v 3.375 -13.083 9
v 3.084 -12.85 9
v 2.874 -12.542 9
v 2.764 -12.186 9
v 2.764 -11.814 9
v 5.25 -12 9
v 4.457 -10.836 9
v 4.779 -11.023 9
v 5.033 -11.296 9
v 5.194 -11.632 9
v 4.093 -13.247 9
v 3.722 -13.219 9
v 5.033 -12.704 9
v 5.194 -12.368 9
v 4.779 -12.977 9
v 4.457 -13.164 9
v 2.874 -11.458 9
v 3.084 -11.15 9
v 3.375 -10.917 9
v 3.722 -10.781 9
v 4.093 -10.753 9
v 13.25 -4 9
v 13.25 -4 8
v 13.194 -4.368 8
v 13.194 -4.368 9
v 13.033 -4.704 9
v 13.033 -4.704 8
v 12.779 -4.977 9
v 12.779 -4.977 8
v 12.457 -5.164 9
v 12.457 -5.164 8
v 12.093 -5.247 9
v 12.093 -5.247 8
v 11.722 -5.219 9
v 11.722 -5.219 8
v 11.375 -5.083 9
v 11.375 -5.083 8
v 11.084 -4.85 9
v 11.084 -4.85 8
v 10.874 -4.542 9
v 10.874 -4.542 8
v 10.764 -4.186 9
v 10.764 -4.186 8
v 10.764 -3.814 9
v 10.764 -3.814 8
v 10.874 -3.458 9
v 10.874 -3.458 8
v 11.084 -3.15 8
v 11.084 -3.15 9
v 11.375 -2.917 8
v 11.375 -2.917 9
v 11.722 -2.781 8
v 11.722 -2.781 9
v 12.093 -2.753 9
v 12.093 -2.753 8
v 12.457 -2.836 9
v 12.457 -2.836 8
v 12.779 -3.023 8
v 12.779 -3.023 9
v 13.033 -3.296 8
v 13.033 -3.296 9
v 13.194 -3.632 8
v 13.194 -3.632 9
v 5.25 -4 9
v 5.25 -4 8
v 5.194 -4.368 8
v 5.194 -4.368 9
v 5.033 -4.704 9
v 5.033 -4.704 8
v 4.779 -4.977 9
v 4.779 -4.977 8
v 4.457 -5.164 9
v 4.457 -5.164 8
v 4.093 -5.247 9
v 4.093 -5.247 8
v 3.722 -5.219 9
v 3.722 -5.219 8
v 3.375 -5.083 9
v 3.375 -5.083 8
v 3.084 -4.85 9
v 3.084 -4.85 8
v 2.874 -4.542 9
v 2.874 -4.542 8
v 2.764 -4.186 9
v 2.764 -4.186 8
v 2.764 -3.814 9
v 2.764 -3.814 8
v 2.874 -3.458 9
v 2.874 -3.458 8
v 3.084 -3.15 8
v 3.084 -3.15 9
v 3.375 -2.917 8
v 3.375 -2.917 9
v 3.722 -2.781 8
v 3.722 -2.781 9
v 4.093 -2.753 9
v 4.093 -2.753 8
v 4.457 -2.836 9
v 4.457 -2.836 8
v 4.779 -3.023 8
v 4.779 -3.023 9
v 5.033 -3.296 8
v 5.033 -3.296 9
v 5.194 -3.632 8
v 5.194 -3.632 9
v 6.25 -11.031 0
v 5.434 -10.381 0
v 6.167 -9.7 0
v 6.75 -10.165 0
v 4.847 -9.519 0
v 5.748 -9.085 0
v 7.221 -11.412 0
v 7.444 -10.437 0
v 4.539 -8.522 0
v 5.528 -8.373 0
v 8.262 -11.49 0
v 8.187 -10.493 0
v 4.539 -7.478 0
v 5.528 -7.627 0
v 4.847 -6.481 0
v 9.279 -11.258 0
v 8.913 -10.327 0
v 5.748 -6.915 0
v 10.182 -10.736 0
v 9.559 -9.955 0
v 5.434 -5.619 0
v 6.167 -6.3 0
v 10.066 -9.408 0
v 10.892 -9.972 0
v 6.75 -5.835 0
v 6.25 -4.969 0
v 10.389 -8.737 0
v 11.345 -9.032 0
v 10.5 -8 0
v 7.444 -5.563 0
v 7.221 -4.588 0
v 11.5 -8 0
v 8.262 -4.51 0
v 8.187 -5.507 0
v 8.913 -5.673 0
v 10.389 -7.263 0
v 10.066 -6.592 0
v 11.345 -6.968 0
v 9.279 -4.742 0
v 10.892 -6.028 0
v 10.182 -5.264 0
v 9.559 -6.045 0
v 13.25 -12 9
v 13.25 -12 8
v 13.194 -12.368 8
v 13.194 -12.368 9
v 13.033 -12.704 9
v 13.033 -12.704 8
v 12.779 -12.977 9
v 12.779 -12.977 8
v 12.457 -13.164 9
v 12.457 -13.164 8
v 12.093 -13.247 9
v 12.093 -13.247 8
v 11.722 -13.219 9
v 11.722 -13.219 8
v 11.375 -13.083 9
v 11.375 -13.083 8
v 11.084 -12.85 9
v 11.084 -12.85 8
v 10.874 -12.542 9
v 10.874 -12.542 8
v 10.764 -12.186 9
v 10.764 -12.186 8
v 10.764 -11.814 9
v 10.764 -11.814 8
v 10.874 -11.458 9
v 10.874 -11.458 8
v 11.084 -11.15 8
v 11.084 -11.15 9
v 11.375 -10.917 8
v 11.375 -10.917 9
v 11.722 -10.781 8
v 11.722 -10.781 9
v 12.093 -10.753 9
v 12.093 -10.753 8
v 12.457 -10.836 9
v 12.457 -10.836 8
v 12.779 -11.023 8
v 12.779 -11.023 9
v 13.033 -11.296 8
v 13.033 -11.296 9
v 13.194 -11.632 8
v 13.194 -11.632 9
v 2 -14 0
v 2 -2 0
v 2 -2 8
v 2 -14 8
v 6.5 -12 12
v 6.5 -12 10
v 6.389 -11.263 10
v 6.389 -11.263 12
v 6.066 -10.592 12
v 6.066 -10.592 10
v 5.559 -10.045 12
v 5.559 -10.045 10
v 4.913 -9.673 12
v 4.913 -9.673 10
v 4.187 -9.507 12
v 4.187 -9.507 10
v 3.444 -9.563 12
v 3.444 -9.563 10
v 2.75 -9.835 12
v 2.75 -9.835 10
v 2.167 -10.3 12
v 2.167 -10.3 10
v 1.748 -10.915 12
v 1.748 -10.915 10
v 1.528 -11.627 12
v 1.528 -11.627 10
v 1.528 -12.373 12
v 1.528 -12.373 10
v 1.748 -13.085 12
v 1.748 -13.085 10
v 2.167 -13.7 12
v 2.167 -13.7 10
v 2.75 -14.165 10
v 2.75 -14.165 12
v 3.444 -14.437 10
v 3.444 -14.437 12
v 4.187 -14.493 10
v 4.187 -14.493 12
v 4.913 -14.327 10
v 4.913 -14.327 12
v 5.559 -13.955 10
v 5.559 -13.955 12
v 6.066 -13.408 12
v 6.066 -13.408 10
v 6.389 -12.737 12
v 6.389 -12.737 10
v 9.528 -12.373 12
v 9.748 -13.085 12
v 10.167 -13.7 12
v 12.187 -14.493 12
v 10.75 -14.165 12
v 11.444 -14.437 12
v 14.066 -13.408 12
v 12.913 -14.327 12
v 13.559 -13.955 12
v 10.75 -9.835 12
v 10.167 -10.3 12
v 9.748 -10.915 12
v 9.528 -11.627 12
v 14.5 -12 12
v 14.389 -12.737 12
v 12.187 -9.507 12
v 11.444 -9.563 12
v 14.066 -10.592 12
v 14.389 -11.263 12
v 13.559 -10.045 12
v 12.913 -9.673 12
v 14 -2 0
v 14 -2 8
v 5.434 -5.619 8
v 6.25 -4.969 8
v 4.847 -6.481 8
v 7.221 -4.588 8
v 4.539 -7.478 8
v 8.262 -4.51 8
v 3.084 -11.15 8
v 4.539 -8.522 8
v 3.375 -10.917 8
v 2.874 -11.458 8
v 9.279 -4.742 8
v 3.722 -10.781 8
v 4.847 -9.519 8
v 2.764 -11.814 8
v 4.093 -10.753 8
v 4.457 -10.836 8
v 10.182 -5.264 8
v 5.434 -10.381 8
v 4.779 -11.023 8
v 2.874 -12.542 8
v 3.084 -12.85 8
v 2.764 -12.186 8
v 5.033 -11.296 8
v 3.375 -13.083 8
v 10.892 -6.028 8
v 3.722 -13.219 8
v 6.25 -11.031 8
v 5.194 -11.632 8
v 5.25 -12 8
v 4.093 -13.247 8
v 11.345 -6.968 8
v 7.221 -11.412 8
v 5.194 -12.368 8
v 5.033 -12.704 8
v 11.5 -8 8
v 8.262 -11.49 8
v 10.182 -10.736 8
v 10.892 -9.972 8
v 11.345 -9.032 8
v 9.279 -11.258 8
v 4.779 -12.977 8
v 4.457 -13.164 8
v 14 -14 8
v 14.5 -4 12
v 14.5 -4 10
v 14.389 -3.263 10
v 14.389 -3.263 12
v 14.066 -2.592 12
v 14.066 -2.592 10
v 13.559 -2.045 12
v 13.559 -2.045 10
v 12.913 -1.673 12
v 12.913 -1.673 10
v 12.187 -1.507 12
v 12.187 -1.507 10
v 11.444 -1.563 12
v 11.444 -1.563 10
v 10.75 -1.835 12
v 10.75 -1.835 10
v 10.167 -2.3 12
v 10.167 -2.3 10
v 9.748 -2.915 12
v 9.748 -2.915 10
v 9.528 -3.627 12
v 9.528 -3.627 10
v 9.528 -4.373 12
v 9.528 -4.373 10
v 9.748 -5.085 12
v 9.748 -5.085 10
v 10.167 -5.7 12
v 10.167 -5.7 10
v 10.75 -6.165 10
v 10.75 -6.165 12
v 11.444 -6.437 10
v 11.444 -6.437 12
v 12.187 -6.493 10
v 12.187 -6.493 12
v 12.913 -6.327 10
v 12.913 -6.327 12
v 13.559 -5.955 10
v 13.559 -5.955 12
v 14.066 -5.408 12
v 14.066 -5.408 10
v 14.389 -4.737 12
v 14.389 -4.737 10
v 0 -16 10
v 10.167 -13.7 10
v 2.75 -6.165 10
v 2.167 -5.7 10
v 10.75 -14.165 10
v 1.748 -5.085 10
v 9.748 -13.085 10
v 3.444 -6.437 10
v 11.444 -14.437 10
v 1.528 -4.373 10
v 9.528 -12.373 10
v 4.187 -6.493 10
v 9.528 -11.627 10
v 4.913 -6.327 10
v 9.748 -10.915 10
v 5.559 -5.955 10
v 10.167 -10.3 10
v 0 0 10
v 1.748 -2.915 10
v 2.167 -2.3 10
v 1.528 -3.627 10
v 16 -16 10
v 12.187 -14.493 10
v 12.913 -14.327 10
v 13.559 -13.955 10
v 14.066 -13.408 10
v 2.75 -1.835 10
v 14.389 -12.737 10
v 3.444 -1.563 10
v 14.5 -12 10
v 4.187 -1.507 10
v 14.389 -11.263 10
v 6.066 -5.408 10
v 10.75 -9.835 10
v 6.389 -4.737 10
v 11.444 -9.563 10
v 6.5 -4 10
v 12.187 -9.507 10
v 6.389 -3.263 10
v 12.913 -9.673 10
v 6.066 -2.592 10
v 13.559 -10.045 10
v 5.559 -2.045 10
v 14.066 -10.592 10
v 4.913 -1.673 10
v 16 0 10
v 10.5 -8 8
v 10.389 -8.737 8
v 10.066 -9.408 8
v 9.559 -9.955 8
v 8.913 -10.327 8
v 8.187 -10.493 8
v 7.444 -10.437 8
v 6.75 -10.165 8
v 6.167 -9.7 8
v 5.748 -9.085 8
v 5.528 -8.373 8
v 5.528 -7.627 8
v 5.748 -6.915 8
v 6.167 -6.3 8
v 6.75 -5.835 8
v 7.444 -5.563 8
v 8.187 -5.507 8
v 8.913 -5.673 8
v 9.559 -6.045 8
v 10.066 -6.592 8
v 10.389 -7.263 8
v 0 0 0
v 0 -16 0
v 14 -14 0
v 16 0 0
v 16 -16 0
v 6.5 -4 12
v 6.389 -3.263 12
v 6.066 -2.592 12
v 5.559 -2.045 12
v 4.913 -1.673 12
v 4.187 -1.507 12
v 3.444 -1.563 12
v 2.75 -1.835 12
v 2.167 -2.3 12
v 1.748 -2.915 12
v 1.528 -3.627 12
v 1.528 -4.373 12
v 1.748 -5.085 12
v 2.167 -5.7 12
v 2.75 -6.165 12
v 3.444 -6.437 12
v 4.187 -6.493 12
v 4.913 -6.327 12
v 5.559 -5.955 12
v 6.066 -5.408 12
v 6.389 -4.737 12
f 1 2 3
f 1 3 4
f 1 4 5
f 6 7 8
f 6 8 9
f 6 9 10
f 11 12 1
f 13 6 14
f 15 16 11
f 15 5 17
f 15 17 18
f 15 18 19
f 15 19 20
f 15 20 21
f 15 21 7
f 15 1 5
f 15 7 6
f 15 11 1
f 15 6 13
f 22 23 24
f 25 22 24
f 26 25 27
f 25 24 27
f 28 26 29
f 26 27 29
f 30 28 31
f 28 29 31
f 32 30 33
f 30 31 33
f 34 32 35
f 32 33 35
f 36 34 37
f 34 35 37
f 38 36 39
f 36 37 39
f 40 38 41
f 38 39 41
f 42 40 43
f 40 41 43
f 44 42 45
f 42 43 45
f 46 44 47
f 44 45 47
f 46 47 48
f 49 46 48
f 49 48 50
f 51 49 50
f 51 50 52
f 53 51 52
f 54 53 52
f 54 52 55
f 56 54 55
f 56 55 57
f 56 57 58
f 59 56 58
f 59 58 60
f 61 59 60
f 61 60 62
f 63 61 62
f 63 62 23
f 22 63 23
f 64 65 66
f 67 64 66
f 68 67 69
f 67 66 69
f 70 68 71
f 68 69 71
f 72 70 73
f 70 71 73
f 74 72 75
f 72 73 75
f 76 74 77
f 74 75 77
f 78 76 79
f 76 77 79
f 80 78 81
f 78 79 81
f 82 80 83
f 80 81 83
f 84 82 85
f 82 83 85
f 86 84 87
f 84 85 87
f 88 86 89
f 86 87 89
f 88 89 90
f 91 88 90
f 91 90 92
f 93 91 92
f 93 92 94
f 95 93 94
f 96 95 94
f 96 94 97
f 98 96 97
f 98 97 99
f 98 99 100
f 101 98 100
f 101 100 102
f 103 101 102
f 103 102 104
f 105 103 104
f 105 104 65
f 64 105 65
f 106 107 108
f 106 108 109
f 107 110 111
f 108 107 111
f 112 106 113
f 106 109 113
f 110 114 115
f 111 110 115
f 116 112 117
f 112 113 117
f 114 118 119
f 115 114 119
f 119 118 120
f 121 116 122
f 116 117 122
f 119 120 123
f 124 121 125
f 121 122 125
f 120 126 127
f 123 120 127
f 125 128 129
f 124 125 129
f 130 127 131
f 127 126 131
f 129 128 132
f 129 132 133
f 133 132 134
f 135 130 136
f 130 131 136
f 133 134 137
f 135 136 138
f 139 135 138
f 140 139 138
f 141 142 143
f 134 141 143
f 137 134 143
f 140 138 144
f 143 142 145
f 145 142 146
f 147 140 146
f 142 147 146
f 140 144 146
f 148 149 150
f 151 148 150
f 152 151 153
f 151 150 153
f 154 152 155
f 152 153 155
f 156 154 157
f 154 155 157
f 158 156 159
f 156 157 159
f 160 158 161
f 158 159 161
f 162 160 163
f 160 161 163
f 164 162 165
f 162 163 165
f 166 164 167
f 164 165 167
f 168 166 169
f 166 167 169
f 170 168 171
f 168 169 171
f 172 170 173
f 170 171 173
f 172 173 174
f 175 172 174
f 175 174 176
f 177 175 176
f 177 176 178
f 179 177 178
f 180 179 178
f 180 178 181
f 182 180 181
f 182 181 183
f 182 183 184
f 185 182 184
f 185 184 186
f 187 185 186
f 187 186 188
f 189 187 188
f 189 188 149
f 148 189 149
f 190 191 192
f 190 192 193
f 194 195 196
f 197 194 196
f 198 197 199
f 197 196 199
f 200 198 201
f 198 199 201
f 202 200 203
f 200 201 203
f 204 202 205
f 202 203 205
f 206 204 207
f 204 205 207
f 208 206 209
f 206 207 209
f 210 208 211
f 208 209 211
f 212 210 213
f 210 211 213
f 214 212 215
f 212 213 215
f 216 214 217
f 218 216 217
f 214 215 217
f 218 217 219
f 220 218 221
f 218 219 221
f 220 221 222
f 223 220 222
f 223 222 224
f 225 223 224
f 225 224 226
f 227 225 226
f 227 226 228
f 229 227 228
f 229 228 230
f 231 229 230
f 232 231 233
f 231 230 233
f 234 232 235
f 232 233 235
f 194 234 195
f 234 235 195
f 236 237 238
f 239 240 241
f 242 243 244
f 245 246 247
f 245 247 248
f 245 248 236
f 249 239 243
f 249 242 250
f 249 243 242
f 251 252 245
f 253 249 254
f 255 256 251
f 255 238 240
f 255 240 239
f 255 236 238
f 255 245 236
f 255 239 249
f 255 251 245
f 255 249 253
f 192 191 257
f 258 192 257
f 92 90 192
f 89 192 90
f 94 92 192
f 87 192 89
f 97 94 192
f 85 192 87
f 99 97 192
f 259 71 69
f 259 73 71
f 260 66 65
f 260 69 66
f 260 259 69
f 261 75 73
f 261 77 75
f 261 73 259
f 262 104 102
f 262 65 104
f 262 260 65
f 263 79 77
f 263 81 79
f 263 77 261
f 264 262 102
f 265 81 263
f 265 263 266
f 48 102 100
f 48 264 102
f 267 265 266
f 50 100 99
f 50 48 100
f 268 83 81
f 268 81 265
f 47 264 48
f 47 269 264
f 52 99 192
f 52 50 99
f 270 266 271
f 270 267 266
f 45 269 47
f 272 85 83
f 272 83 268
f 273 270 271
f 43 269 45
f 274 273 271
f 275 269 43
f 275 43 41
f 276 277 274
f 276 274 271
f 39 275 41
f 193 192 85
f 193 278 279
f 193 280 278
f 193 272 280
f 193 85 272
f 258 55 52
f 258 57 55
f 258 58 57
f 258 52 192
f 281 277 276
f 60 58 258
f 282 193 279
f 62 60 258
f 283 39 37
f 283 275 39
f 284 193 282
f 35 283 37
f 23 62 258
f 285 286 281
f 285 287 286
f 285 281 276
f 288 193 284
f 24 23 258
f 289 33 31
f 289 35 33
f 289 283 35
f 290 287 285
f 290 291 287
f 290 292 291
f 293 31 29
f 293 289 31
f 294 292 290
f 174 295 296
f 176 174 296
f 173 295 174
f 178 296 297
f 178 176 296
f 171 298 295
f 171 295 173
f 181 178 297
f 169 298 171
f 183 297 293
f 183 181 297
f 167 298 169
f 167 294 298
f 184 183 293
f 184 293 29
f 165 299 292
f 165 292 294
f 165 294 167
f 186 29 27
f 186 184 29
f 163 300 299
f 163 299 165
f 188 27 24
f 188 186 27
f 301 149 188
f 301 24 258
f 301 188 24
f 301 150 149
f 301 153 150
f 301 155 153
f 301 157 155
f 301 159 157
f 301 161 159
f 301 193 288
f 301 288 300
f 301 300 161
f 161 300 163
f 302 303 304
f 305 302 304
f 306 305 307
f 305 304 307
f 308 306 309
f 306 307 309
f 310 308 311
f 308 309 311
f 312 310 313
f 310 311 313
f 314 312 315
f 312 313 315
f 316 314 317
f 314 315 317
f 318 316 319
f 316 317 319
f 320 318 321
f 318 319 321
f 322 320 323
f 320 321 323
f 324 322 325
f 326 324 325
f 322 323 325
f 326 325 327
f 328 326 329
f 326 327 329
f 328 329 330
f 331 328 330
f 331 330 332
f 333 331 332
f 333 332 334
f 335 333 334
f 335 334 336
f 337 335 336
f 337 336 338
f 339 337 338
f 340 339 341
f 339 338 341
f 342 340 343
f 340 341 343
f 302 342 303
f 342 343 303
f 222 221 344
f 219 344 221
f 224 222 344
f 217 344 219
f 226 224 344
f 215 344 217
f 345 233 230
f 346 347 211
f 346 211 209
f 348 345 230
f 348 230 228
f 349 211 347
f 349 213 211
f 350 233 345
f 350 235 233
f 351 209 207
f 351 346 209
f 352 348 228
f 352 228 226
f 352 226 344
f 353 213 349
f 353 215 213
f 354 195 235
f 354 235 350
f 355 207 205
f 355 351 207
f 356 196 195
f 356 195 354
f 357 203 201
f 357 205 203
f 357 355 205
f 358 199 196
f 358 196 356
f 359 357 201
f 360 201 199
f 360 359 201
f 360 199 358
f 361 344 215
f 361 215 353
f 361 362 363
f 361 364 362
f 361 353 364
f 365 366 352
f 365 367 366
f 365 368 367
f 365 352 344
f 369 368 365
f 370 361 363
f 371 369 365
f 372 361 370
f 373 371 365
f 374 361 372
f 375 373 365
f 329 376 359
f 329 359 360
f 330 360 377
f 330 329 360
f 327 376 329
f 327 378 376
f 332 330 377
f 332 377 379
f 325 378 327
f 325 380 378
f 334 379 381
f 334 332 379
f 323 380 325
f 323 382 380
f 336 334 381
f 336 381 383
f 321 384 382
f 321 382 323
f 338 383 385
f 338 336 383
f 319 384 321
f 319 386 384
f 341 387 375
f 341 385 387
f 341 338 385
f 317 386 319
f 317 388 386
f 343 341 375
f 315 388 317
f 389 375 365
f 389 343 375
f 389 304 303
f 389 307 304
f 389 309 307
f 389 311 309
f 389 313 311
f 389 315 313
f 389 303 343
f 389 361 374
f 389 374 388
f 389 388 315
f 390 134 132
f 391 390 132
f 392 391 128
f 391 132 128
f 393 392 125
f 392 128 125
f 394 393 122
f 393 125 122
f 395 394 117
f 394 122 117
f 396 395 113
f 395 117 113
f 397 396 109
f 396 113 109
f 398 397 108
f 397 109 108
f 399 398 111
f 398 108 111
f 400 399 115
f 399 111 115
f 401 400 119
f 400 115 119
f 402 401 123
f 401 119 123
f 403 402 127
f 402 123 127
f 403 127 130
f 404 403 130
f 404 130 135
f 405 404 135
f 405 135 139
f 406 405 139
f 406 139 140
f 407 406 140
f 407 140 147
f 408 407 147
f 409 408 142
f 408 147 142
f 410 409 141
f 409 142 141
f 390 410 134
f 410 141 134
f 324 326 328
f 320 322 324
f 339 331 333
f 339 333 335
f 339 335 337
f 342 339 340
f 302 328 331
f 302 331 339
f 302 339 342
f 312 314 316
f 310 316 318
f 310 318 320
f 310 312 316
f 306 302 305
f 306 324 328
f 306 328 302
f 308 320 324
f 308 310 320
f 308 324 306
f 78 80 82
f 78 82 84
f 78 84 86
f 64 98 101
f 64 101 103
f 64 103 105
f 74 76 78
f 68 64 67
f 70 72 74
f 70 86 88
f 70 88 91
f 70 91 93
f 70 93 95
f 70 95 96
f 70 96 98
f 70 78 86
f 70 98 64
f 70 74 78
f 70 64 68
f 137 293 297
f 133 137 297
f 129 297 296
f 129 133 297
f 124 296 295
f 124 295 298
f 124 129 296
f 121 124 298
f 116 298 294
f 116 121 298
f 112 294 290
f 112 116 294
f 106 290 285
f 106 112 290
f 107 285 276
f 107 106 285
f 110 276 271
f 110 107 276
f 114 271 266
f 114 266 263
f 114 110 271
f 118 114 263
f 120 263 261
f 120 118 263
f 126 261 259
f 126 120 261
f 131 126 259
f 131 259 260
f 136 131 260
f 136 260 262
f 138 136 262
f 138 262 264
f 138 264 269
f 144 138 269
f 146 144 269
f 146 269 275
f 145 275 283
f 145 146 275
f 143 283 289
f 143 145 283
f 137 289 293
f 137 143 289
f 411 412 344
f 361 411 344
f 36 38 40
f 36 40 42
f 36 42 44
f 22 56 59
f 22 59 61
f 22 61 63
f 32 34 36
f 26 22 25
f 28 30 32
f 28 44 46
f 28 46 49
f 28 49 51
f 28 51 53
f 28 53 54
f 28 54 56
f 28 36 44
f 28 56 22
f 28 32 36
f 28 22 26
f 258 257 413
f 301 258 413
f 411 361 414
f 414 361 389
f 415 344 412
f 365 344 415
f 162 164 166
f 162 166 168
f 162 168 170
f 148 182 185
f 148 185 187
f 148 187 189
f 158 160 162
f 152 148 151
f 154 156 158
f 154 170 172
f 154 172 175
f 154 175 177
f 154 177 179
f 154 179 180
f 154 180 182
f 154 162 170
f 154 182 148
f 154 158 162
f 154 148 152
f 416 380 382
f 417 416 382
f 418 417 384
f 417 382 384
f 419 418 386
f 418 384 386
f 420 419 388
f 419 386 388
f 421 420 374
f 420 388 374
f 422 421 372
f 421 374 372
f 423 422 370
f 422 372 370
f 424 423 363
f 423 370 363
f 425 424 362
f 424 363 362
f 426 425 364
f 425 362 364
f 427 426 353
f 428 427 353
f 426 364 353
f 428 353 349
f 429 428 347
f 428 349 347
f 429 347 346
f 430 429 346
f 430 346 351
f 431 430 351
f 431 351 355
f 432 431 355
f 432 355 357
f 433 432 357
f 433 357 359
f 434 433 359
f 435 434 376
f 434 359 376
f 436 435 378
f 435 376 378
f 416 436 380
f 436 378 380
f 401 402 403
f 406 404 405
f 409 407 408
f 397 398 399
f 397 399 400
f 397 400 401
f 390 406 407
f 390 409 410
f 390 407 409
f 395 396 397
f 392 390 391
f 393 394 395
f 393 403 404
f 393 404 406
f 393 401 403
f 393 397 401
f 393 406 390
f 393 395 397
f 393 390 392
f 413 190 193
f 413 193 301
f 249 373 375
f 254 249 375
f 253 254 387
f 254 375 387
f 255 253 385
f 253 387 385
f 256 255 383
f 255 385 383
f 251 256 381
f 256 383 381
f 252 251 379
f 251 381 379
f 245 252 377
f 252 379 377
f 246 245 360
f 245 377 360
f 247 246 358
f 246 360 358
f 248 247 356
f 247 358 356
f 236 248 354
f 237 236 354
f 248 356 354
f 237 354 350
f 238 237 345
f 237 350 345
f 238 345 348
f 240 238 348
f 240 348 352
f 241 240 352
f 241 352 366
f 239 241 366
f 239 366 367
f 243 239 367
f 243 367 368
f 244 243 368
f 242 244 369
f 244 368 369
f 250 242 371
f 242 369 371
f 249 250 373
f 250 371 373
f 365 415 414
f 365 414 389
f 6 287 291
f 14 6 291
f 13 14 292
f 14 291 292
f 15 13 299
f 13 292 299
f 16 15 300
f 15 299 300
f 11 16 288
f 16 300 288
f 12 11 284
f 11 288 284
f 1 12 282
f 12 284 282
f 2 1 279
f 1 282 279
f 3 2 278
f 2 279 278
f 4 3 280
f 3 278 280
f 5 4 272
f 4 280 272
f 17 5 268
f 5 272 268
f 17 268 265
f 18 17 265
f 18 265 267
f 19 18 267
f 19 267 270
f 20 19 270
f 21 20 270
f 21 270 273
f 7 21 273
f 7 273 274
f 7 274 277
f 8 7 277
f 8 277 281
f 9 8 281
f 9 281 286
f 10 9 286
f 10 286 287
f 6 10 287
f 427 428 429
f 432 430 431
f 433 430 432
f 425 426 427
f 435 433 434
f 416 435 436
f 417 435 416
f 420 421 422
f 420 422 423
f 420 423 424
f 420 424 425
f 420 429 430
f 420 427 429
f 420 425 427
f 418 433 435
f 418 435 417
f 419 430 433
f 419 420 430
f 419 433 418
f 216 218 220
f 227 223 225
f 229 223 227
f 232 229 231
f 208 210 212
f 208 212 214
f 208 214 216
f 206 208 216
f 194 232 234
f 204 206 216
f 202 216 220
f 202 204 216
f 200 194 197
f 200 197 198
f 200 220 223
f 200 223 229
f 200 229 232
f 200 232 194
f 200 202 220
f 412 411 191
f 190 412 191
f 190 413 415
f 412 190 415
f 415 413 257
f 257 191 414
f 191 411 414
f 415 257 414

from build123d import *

# Parameters (mm, degrees)
F0_W     = 16
F0_H     = 10
F1_DEPTH = 16
F2_R     = 2.5
F3_DEPTH = 2
F5_W     = 12
F5_H     = 12
F5_R     = 3.5
F5_R_2   = 2.5
F6_DEPTH = 8
F7_R     = 1.25
F8_DEPTH = 9


with BuildPart() as f1:
    # F0 (on Front) → F1 (new body)
    with BuildSketch(Plane.XZ):
        with Locations((8, 5)):
            Rectangle(F0_W, F0_H)
    extrude(amount=F1_DEPTH)

    # F2 (on face) → F3 (join)
    with BuildSketch(Plane.XY.offset(10)):
        with Locations((4, -4)):
            Circle(F2_R)
        with Locations((12, -4)):
            Circle(F2_R)
        with Locations((4, -12)):
            Circle(F2_R)
        with Locations((12, -12)):
            Circle(F2_R)
    extrude(amount=F3_DEPTH)

    # F5 (on face) → F6 (cut)
    with BuildSketch(Plane(origin=(0, 0, 0), x_dir=(1, 0, 0), z_dir=(0, 0, -1))):
        with Locations((8, 8)):
            Rectangle(F5_W, F5_H)
        with Locations((8, 8)):
            Circle(F5_R, mode=Mode.SUBTRACT)
        with Locations((8, 8)):
            Circle(F5_R_2)
    extrude(amount=-F6_DEPTH, mode=Mode.SUBTRACT)

    # F7 (on face) → F8 (cut)
    with BuildSketch(Plane(origin=(0, 0, 0), x_dir=(1, 0, 0), z_dir=(0, 0, -1))):
        with Locations((12, 12)):
            Circle(F7_R)
        with Locations((4, 12)):
            Circle(F7_R)
        with Locations((4, 4)):
            Circle(F7_R)
        with Locations((12, 4)):
            Circle(F7_R)
    extrude(amount=-F8_DEPTH, mode=Mode.SUBTRACT)


solid = f1.part
